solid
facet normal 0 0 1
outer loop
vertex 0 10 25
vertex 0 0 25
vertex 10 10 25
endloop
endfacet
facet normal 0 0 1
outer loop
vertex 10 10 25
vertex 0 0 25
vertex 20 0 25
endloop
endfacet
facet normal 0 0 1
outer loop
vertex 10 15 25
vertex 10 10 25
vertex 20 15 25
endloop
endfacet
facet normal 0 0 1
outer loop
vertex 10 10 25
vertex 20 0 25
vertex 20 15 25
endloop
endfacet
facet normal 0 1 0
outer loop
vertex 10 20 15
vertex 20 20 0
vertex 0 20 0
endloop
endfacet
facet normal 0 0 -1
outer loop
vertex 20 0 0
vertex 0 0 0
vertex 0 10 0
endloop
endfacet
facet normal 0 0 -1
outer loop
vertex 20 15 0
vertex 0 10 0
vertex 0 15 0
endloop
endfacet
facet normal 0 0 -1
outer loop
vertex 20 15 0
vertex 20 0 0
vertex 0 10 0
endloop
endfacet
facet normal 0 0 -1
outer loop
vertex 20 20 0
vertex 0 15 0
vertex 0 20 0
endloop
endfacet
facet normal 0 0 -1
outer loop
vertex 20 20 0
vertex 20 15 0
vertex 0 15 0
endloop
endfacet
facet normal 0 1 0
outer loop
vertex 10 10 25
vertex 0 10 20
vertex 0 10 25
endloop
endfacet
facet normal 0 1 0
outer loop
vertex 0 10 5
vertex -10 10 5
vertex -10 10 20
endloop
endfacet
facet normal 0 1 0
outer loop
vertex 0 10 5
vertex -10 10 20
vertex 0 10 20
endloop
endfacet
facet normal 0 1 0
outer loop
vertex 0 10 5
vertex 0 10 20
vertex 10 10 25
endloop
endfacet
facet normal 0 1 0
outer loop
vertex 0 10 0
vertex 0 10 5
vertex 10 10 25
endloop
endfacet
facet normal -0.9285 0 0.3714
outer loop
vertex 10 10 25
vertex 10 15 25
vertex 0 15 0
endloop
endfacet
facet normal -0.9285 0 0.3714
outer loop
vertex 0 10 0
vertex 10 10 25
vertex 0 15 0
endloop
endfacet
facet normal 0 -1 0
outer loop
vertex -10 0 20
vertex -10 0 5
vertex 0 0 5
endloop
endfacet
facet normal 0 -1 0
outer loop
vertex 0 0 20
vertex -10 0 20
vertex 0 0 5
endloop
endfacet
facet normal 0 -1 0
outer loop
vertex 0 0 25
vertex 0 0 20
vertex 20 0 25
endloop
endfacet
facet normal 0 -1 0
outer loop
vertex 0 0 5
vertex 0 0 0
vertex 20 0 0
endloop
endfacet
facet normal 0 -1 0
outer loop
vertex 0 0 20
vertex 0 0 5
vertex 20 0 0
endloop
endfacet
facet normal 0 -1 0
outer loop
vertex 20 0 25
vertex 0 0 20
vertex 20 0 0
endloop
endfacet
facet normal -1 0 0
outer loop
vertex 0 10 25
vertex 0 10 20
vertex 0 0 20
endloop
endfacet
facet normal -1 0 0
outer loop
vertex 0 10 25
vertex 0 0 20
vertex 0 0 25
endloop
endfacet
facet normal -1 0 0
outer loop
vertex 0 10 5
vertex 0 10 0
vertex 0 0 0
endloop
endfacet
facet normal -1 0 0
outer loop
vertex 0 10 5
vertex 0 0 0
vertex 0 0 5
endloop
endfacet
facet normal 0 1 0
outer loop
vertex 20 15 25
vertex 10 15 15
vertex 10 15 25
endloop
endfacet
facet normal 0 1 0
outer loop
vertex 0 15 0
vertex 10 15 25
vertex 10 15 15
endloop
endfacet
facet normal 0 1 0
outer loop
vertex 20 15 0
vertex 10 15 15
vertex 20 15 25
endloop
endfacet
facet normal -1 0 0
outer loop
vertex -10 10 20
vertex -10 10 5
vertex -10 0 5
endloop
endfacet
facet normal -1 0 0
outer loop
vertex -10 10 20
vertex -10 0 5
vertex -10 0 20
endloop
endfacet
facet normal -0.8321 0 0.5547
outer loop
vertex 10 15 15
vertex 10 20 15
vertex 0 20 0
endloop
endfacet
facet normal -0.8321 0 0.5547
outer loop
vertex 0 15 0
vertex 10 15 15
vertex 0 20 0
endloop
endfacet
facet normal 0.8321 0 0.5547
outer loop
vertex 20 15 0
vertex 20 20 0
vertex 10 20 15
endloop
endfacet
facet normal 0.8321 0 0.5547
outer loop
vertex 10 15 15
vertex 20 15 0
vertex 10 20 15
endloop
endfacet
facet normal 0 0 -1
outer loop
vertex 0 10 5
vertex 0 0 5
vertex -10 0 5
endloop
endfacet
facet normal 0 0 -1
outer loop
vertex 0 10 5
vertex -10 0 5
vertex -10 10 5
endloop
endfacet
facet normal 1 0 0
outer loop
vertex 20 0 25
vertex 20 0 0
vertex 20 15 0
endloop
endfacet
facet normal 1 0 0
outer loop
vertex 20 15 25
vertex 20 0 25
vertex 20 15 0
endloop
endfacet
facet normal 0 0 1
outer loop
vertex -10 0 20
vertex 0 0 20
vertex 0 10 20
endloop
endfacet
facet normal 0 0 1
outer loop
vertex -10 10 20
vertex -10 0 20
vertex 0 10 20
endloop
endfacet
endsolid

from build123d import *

# Parameters (mm, degrees)
BOSS_EXTRUDE1_DEPTH = 25
SKETCH2_W           = 15
SKETCH2_H           = 10
BOSS_EXTRUDE2_DEPTH = 10
SKETCH3_W           = 25
SKETCH3_H           = 10
BOSS_EXTRUDE3_DEPTH = 10
CUT_EXTRUDE1_DEPTH  = 5
CUT_EXTRUDE2_DEPTH  = 5


with BuildPart() as part:
    # Sketch1 → Boss-Extrude1 (new body)
    with BuildSketch(Plane.XY):
        Polygon((0, 0), (20, 0), (20, 20), (10, 20), (10, 10), (0, 10), align=None)
    extrude(amount=BOSS_EXTRUDE1_DEPTH)

    # Sketch2 → Boss-Extrude2 (add)
    with BuildSketch(Plane.ZY):
        with Locations((12.5, 5)):
            Rectangle(SKETCH2_W, SKETCH2_H)
    extrude(amount=BOSS_EXTRUDE2_DEPTH)

    # Sketch3 → Boss-Extrude3 (add)
    with BuildSketch(Plane.ZY.offset(-10)):
        with Locations((12.5, 15)):
            Rectangle(SKETCH3_W, SKETCH3_H)
    extrude(amount=BOSS_EXTRUDE3_DEPTH)

    # Sketch5 → Cut-Extrude1 (cut)
    with BuildSketch(Plane(origin=(0, 20, 0), x_dir=(1, 0, 0), z_dir=(0, 1, 0))):
        Polygon((0, 0), (0, -25), (20, -25), (20, 0), (10, -15), align=None)
    extrude(amount=-CUT_EXTRUDE1_DEPTH, mode=Mode.SUBTRACT)

    # Sketch6 → Cut-Extrude2 (cut)
    with BuildSketch(Plane(origin=(0, 15, 0), x_dir=(1, 0, 0), z_dir=(0, 1, 0))):
        Polygon((0, -25), (10, -25), (0, 0), align=None)
    extrude(amount=-CUT_EXTRUDE2_DEPTH, mode=Mode.SUBTRACT)


solid = part.part
